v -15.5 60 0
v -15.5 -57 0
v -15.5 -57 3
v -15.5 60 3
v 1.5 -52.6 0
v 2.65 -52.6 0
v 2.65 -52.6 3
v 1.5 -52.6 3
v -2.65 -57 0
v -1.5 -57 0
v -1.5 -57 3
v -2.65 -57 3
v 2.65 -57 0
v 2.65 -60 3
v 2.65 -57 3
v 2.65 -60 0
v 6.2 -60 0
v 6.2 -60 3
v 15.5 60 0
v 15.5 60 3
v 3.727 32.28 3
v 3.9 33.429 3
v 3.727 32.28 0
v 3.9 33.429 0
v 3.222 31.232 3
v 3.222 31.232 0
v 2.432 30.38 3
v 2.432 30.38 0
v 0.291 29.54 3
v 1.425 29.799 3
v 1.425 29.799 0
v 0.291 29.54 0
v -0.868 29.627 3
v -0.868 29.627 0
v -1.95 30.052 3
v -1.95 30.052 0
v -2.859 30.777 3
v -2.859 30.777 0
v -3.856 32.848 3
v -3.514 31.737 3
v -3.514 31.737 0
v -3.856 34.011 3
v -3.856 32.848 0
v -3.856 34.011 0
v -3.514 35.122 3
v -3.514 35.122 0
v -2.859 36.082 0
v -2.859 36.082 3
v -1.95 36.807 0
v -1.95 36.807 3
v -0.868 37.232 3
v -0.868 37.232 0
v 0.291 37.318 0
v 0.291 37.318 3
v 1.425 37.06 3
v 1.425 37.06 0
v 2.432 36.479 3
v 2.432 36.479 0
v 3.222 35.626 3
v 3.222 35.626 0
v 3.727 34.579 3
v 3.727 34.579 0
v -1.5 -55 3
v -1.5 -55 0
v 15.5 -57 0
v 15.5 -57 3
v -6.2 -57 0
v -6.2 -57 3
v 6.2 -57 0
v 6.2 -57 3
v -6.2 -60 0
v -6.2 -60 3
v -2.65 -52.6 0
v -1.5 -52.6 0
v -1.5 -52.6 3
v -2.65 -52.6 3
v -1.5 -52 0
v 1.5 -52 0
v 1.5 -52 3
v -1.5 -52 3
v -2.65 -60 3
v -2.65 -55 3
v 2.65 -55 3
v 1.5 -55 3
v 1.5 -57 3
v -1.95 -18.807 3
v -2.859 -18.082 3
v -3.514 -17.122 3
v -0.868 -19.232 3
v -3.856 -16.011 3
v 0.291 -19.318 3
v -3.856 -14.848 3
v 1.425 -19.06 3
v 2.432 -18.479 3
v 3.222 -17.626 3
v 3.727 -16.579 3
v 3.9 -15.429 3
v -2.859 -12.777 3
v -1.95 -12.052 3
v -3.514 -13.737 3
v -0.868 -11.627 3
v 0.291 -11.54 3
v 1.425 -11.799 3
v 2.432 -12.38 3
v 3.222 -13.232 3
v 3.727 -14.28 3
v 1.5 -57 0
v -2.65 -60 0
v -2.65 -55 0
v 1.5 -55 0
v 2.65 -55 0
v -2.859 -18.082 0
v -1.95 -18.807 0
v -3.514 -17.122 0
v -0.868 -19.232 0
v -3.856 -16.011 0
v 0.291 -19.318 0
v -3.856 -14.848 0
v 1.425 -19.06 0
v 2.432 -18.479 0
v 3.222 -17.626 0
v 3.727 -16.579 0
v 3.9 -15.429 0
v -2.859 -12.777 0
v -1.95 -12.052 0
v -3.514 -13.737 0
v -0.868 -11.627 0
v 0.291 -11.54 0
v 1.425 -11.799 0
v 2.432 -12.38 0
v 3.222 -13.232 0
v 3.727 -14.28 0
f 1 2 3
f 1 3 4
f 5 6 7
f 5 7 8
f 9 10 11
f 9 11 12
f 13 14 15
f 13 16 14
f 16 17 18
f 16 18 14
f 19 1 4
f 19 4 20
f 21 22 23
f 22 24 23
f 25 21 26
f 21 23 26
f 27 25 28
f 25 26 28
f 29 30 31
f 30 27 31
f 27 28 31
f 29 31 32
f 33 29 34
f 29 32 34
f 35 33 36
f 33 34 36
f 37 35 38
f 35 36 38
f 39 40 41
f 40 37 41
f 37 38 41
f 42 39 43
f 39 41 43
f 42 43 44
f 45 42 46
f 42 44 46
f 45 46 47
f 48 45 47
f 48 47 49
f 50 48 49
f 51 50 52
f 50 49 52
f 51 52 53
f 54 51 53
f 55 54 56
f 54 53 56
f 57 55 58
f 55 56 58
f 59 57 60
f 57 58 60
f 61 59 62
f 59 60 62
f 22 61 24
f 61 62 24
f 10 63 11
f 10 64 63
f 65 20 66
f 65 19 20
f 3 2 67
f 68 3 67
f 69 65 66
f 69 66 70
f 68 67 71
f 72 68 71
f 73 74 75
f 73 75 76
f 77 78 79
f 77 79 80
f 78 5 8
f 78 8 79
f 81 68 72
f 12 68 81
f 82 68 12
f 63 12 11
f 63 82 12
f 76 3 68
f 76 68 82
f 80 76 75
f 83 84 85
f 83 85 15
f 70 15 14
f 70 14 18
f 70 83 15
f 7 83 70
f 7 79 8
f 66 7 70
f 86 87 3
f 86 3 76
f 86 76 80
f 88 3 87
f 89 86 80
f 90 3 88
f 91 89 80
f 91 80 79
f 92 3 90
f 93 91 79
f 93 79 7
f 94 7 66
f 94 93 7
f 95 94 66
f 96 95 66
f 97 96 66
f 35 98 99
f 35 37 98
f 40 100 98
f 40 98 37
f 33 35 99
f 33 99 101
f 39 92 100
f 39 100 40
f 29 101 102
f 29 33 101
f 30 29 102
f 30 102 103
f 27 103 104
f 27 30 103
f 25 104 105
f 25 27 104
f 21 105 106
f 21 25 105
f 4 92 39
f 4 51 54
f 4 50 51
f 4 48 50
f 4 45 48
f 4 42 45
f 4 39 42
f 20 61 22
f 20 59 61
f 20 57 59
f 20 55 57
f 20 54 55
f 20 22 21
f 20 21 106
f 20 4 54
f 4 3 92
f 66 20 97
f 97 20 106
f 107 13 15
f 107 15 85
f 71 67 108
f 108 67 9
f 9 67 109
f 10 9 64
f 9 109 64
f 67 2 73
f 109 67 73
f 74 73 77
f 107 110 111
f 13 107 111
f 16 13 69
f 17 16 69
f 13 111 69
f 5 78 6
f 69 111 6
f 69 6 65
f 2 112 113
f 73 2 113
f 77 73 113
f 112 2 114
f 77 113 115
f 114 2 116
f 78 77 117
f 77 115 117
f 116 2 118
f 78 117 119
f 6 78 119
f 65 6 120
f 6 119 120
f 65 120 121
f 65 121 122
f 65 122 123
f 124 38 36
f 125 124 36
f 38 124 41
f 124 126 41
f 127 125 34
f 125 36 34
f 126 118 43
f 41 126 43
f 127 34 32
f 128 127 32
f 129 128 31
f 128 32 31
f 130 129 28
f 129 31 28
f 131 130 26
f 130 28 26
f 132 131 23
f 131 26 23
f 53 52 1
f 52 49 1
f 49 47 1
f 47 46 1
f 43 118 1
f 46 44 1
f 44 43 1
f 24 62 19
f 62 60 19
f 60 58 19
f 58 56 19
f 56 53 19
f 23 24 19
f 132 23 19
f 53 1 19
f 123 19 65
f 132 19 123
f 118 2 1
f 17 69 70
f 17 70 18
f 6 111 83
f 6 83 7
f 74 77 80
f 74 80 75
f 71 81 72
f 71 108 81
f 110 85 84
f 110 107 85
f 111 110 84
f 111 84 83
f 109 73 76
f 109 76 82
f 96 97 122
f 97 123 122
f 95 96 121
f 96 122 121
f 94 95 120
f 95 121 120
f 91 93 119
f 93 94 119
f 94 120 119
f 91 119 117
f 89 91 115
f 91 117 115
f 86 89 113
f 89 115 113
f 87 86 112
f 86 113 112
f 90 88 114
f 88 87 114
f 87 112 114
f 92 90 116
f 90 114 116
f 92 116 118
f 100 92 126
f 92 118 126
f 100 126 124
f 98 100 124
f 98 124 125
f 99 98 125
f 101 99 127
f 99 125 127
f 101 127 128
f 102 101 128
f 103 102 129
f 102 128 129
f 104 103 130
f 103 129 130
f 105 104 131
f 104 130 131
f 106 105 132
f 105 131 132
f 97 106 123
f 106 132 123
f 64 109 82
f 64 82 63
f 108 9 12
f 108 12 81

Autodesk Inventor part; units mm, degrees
ref_plane "YZ Plane" through (0, 0, 0) normal (1, 0, 0) x (0, 1, 0)
ref_plane "XZ Plane" through (0, 0, 0) normal (0, 1, 0) x (-1, 0, 0)
ref_plane "XY Plane" through (0, 0, 0) normal (0, 0, 1) x (1, 0, 0)
sketch "Sketch1" plane through (0, 0, 0) normal (0, 0, 1) x (1, 0, 0)
  line L0 (-15.5, 60) -> (15.5, 60)
  line L1 (15.5, 60) -> (15.5, -57)
  line L2 (-15.5, -57) -> (-15.5, 60)
  line L3 (-15.5, 60) -> (15.5, -60) construction
  line L4 (15.5, 60) -> (-15.5, -60) construction
  line L5 (15.5, -57) -> (6.2, -57)
  line L6 (6.2, -57) -> (6.2, -60)
  line L7 (2.65, -60) -> (2.65, -57)
  line L8 (2.65, -57) -> (1.5, -57)
  line L9 (1.5, -57) -> (1.5, -55)
  line L10 (1.5, -55) -> (2.65, -55)
  line L11 (2.65, -55) -> (2.65, -52.6)
  line L12 (2.65, -52.6) -> (1.5, -52.6)
  line L13 (1.5, -52.6) -> (1.5, -52)
  line L14 (1.5, -52) -> (-1.5, -52)
  line L15 (-1.5, -52) -> (-1.5, -52.6)
  line L16 (-1.5, -52.6) -> (-2.65, -52.6)
  line L17 (-2.65, -52.6) -> (-2.65, -55)
  line L18 (-2.65, -55) -> (-1.5, -55)
  line L19 (-1.5, -57) -> (-2.65, -57)
  line L20 (-1.5, -55) -> (-1.5, -57)
  line L21 (-2.65, -57) -> (-2.65, -60)
  line L22 (-15.5, -57) -> (-6.2, -57)
  line L23 (-6.2, -57) -> (-6.2, -60)
  line L24 (0, -51.179) -> (0, -61.7681) construction
  line L25 (6.2, -60) -> (2.65, -60)
  line L26 (-2.65, -60) -> (-6.2, -60)
  line L27 (-24.2882, 0) -> (26.7754, 0) construction
  circle A0 centre (0, -15.4294) radius 3.9
  circle A1 centre (0, 33.4294) radius 3.9
  point P0 (0, 0)
  dimension "d0" = 31
  dimension "d4" = 3
  dimension "d6" = 3
  dimension "d7" = 2.4
  dimension "d10" = 5.3
  dimension "d11" = 8
  dimension "d12" = 5
  dimension "d13" = 12.4
  dimension "d14" = 7.8
  dimension "d15" = 44.5706
  dimension "d16" = 7.8
  dimension "d17" = 93.4294
extrude "Extrusion1" add sketch "Sketch1" along normal blind 3
equation "\"d13\" = 0.4 * d0"
properties part number "Y-Shaft-Holder-Front"
